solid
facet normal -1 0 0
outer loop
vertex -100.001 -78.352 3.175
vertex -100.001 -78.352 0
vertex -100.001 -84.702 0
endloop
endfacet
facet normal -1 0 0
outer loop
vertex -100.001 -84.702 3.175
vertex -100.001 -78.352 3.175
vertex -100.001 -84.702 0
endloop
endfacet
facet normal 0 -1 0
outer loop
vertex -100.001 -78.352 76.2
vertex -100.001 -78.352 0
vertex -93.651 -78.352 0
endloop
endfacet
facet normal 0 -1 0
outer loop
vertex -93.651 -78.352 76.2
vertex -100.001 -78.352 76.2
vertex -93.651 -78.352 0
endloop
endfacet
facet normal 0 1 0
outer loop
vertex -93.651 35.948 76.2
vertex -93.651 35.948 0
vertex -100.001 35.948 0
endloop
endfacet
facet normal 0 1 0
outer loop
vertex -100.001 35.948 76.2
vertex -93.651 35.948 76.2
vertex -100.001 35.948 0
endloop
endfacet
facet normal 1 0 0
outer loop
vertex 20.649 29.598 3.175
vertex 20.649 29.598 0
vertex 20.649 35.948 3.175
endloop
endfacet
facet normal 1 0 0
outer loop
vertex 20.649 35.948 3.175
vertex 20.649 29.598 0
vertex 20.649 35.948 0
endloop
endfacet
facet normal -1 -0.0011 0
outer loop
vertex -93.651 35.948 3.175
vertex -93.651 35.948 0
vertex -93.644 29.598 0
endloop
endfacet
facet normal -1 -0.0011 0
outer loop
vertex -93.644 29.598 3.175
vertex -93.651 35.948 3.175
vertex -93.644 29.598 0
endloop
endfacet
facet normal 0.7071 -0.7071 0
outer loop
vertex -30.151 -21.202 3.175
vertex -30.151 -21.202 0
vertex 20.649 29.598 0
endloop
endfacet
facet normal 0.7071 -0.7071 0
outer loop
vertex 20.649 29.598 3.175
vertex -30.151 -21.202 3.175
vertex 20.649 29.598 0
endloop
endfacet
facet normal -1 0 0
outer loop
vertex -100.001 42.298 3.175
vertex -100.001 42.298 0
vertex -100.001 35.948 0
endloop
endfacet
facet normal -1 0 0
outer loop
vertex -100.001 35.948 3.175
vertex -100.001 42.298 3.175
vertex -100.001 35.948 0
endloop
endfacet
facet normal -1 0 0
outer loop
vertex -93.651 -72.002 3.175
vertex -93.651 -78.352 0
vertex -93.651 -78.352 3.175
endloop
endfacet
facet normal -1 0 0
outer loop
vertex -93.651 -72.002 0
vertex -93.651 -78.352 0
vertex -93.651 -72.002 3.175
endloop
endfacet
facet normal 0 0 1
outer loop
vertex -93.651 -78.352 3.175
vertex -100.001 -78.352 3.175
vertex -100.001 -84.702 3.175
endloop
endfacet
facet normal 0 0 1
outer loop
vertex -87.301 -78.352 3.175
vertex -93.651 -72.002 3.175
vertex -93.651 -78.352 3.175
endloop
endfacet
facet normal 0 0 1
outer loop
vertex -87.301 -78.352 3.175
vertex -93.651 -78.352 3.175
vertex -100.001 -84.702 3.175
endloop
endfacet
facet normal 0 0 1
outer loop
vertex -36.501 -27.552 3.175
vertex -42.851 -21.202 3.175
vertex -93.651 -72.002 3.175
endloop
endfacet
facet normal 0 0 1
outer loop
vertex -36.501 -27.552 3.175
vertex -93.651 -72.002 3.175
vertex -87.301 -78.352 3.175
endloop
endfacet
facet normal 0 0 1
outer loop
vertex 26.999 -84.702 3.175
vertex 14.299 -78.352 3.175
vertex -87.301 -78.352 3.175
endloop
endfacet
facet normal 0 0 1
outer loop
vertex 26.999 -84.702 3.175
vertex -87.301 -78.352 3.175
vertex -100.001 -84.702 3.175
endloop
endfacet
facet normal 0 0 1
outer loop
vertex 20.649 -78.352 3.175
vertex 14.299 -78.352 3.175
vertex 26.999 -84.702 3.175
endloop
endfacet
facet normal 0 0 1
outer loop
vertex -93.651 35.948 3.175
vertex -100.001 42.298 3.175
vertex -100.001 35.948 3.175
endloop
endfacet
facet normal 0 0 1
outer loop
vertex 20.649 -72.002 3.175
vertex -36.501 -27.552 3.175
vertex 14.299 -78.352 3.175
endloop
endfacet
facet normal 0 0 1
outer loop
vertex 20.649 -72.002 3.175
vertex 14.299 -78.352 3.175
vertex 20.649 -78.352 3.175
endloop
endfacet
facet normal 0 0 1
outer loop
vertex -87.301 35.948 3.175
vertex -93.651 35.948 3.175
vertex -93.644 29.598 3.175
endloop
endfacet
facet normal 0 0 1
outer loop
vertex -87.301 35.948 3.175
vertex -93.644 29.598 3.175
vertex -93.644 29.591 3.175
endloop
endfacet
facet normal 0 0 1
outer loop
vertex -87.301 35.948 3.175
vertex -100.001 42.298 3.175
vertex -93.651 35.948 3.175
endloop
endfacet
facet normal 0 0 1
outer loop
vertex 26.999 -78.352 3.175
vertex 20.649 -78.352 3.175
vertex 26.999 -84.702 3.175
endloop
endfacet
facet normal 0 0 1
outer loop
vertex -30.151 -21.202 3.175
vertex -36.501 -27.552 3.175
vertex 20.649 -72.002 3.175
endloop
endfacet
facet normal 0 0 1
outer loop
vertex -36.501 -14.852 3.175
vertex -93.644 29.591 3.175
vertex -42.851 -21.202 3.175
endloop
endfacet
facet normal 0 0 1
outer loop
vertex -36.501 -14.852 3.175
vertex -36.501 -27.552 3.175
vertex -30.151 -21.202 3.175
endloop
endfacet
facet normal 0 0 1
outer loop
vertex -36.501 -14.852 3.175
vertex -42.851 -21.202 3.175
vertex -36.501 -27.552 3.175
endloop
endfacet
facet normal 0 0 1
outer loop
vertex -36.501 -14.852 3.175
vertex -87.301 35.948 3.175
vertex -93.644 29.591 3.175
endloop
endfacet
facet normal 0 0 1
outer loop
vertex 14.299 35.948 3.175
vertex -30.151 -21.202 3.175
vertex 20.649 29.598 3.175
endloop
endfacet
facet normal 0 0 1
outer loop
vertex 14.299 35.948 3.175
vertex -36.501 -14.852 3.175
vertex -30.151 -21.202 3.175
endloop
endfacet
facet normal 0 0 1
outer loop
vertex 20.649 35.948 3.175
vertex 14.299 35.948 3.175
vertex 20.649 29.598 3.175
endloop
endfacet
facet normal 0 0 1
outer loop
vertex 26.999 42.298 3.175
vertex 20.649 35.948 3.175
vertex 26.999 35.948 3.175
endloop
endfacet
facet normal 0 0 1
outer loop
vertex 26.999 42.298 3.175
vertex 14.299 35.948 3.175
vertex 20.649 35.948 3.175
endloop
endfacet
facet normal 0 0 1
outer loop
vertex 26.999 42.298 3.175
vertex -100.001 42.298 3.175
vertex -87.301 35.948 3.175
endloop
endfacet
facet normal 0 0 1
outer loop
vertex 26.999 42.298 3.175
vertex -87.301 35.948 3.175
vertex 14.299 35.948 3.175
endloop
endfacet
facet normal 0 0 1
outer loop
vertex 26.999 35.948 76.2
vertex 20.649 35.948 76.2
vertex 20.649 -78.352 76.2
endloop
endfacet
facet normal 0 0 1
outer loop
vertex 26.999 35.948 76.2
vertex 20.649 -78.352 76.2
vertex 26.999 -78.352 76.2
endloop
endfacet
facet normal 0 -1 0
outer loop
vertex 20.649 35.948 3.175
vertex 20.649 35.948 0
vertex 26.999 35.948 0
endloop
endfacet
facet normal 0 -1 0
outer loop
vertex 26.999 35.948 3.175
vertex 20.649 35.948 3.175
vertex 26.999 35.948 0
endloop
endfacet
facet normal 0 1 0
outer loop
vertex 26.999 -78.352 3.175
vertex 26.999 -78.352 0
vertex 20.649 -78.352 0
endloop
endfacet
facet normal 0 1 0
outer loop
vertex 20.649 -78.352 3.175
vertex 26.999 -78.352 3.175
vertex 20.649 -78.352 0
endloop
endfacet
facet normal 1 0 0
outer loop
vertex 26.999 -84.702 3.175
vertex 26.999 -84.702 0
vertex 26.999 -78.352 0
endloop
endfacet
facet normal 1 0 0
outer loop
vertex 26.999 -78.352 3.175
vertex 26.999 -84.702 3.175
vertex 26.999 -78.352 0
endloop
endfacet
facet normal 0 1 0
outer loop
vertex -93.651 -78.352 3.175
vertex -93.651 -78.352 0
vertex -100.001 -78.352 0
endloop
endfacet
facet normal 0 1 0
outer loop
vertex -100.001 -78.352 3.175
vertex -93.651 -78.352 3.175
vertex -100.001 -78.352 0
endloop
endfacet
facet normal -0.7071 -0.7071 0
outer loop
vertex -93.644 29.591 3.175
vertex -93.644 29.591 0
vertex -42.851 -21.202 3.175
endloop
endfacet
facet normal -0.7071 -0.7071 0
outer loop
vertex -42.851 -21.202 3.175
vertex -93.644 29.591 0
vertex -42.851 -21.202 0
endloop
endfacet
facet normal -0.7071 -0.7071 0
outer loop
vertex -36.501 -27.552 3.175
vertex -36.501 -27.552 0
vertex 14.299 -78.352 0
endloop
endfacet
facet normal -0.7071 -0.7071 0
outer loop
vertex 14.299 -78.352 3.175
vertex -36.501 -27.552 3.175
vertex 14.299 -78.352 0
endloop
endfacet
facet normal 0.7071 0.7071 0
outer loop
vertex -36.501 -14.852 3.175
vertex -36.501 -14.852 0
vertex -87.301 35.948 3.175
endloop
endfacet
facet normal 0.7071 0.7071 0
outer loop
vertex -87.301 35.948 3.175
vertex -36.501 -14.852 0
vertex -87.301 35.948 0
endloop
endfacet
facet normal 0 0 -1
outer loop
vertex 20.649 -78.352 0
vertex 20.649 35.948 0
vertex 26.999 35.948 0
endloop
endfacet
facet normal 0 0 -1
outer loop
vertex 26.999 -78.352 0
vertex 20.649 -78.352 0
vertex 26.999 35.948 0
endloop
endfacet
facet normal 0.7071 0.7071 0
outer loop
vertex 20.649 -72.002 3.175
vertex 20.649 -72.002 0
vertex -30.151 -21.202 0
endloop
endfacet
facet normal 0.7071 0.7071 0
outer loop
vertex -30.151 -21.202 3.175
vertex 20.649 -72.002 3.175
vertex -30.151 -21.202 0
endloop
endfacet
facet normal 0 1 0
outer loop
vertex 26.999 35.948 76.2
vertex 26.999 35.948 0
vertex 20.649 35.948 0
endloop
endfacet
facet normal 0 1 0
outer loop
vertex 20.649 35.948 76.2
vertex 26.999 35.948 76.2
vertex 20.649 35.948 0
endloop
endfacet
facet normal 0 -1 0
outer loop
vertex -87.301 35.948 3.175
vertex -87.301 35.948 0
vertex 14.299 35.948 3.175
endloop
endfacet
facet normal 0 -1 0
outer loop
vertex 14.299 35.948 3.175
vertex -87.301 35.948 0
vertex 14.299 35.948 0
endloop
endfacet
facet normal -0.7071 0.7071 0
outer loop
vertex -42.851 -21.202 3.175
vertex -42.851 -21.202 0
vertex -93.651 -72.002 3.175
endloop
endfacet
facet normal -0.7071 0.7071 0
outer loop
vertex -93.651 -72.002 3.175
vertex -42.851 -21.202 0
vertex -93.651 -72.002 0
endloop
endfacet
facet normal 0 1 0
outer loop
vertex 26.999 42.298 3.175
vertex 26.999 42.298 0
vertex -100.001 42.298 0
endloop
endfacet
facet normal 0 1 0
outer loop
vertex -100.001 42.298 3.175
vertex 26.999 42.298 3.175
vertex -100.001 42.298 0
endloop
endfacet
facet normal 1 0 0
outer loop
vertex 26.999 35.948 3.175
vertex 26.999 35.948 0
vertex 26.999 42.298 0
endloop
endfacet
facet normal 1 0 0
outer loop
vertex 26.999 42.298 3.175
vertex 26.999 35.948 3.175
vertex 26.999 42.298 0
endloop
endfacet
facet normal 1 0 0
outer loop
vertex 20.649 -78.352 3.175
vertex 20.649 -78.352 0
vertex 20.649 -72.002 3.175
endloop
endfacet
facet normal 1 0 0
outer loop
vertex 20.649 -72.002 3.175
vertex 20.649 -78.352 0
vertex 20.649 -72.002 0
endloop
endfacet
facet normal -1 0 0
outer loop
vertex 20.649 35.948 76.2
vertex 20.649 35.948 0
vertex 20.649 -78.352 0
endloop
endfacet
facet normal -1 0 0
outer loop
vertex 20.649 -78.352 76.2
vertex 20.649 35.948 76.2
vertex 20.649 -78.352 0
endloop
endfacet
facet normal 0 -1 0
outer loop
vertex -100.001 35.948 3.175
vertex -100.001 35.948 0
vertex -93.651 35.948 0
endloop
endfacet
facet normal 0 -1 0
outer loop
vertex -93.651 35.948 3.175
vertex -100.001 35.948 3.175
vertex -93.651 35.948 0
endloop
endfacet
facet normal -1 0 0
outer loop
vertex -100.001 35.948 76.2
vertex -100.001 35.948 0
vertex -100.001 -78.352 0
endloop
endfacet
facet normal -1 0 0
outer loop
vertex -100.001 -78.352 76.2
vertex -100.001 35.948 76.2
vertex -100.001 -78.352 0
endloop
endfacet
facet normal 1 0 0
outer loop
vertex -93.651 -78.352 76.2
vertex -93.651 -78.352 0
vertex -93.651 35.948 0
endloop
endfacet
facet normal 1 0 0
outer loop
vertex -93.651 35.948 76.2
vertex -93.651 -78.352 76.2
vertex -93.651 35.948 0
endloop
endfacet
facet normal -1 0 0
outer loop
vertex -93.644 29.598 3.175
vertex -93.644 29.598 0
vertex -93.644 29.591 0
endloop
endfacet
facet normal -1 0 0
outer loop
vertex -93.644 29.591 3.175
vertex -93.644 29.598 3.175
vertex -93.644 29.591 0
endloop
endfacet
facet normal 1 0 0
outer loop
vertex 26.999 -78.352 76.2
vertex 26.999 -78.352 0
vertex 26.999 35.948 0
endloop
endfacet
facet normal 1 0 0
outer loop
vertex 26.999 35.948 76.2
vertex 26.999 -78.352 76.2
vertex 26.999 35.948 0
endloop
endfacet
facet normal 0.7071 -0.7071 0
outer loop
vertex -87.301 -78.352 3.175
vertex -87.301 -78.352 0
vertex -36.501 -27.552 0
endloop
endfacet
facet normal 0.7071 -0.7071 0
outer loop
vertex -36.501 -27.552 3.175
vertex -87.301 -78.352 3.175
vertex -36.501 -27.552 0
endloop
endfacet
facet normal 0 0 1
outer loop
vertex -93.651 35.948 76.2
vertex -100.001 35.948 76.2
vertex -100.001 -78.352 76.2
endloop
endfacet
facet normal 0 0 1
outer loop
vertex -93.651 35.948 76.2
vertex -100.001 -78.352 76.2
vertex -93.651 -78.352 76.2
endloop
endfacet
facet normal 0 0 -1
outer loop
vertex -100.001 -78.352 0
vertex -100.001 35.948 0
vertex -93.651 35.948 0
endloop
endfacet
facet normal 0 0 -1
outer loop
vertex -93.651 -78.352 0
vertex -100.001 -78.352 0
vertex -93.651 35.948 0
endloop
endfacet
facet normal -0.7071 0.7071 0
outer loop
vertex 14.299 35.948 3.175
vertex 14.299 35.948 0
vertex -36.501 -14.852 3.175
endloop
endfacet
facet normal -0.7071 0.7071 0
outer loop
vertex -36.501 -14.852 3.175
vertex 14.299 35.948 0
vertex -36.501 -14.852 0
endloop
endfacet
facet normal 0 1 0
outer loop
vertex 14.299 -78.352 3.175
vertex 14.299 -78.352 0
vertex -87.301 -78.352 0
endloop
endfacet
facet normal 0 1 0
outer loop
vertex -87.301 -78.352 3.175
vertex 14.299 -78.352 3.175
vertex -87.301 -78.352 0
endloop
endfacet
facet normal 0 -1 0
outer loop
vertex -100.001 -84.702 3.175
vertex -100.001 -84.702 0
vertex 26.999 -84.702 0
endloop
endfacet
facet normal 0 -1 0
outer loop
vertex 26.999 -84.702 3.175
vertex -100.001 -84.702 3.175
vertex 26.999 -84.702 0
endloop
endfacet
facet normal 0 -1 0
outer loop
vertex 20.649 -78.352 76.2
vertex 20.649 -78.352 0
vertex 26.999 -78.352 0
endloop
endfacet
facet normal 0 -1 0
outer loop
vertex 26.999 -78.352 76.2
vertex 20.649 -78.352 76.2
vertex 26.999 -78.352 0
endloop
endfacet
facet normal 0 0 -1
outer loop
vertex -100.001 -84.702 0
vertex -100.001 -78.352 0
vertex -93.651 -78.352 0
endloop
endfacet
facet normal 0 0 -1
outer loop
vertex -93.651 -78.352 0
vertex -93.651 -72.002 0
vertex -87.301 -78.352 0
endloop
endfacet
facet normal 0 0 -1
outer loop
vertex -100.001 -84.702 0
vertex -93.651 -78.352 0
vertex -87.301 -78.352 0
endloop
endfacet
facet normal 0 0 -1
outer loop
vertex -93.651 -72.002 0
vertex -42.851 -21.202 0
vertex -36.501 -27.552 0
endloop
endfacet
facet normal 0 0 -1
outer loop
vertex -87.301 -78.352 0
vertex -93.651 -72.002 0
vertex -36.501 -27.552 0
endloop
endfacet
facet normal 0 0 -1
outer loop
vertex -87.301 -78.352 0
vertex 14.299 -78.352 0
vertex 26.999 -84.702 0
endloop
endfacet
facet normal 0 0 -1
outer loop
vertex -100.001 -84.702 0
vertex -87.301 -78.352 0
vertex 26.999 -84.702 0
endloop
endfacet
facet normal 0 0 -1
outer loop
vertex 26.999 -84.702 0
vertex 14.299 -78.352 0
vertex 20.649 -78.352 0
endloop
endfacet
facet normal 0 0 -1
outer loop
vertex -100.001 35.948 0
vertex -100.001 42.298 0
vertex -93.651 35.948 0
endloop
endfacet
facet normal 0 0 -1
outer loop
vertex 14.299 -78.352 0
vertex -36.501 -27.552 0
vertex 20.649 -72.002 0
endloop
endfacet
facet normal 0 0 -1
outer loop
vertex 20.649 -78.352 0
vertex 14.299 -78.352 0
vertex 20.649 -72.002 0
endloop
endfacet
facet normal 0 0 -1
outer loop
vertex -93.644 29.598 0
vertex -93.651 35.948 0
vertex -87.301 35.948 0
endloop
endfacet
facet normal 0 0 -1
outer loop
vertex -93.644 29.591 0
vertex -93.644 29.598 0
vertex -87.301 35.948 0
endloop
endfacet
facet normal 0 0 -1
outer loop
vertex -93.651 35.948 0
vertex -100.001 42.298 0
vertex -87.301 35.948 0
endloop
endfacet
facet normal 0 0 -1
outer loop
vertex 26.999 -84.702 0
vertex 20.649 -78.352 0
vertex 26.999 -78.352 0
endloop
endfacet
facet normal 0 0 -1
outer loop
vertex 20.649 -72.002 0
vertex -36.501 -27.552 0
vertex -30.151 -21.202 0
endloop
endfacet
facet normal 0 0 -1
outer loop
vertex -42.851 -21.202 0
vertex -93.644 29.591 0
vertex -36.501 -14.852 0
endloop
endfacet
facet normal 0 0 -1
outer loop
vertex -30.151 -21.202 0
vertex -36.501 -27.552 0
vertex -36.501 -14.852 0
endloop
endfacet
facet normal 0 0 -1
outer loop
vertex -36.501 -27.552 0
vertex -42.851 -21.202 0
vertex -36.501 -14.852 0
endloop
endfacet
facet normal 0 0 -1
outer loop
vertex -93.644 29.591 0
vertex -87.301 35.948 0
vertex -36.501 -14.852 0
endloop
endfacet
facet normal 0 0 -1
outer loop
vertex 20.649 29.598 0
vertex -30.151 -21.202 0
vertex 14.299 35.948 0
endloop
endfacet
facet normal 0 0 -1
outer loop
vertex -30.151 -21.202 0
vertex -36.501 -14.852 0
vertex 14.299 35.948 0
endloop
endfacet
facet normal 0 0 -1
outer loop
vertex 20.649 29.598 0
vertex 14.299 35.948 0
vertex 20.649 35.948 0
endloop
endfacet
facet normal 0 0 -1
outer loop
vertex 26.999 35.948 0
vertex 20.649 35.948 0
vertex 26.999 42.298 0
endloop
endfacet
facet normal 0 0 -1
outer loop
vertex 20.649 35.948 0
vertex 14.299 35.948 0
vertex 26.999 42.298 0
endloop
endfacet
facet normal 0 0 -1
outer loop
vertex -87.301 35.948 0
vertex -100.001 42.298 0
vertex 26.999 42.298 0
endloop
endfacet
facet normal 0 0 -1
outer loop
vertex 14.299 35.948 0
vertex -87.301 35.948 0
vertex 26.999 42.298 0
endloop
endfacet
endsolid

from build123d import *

# Parameters (mm, degrees)
F0_W     = 6.35
F0_H     = 6.35
F1_DEPTH = 3.175
F2_DEPTH = 76.2
F3_DEPTH = 76.2


with BuildPart() as f1:
    # F0 (on Top) → F1 (new body)
    with BuildSketch(Plane.XY):
        with Locations((-90.4763010761, -75.1771691605)):
            Rectangle(F0_W, F0_H)
        Polygon((-42.8513010761, -21.2021691605), (-93.6513010761, -72.0021691605), (-87.3013010761, -72.0021691605), (-87.3013010761, -78.3521691605), (-36.5013010761, -27.5521691605), align=None)
        Polygon((20.6486989239, -72.0021691605), (-30.1513010761, -21.2021691605), (-36.5013010761, -27.5521691605), (14.2986989239, -78.3521691605), (14.2986989239, -72.0021691605), align=None)
        Polygon((-36.5013010761, -14.8521691605), (-87.3013010761, 35.9478308395), (-87.3013010761, 29.5978308395), (-93.6439880831, 29.5978308395), (-93.6439796514, 29.5905094148), (-42.8513010761, -21.2021691605), align=None)
        Polygon((14.2986989239, 29.5978308395), (14.2986989239, 35.9478308395), (-36.5013010761, -14.8521691605), (-30.1513010761, -21.2021691605), (20.6486989239, 29.5978308395), align=None)
        with Locations((17.4736989239, 32.7728308395)):
            Rectangle(F0_W, F0_H)
        Polygon((-30.1513010761, -21.2021691605), (-36.5013010761, -14.8521691605), (-42.8513010761, -21.2021691605), (-36.5013010761, -27.5521691605), align=None)
        Polygon((-87.3013010761, 35.9478308395), (-93.6513010761, 35.9478308395), (-93.6439880831, 29.5978308395), (-87.3013010761, 29.5978308395), align=None)
        with Locations((17.4736989239, -75.1771691605)):
            Rectangle(F0_W, F0_H)
        Polygon((-100.0013010761, 35.9478308395), (-93.6513010761, 35.9478308395), (-87.3013010761, 35.9478308395), (14.2986989239, 35.9478308395), (20.6486989239, 35.9478308395), (26.9986989239, 35.9478308395), (26.9986989239, 42.2978308395), (-100.0013010761, 42.2978308395), align=None)
        Polygon((-93.6513010761, -78.3521691605), (-100.0013010761, -78.3521691605), (-100.0013010761, -84.7021691605), (26.9986989239, -84.7021691605), (26.9986989239, -78.3521691605), (20.6486989239, -78.3521691605), (14.2986989239, -78.3521691605), (4.1404153609, -78.3521691605), (-87.3013010761, -78.3521691605), align=None)
    extrude(amount=F1_DEPTH)


with BuildPart() as f2:
    # F0 (on Top) → F2 (new body)
    with BuildSketch(Plane.XY):
        Polygon((-93.6513010761, 29.5978308395), (-93.6513010761, 35.9478308395), (-100.0013010761, 35.9478308395), (-100.0013010761, -78.3521691605), (-93.6513010761, -78.3521691605), (-93.6513010761, -72.0021691605), align=None)
    extrude(amount=F2_DEPTH)


with BuildPart() as f3:
    # F0 (on Top) → F3 (new body)
    with BuildSketch(Plane.XY):
        Polygon((26.9986989239, 35.9478308395), (20.6486989239, 35.9478308395), (20.6486989239, 29.5978308395), (20.6486989239, -72.0021691605), (20.6486989239, -78.3521691605), (26.9986989239, -78.3521691605), align=None)
    extrude(amount=F3_DEPTH)


solid = Compound([f1.part, f2.part, f3.part])
